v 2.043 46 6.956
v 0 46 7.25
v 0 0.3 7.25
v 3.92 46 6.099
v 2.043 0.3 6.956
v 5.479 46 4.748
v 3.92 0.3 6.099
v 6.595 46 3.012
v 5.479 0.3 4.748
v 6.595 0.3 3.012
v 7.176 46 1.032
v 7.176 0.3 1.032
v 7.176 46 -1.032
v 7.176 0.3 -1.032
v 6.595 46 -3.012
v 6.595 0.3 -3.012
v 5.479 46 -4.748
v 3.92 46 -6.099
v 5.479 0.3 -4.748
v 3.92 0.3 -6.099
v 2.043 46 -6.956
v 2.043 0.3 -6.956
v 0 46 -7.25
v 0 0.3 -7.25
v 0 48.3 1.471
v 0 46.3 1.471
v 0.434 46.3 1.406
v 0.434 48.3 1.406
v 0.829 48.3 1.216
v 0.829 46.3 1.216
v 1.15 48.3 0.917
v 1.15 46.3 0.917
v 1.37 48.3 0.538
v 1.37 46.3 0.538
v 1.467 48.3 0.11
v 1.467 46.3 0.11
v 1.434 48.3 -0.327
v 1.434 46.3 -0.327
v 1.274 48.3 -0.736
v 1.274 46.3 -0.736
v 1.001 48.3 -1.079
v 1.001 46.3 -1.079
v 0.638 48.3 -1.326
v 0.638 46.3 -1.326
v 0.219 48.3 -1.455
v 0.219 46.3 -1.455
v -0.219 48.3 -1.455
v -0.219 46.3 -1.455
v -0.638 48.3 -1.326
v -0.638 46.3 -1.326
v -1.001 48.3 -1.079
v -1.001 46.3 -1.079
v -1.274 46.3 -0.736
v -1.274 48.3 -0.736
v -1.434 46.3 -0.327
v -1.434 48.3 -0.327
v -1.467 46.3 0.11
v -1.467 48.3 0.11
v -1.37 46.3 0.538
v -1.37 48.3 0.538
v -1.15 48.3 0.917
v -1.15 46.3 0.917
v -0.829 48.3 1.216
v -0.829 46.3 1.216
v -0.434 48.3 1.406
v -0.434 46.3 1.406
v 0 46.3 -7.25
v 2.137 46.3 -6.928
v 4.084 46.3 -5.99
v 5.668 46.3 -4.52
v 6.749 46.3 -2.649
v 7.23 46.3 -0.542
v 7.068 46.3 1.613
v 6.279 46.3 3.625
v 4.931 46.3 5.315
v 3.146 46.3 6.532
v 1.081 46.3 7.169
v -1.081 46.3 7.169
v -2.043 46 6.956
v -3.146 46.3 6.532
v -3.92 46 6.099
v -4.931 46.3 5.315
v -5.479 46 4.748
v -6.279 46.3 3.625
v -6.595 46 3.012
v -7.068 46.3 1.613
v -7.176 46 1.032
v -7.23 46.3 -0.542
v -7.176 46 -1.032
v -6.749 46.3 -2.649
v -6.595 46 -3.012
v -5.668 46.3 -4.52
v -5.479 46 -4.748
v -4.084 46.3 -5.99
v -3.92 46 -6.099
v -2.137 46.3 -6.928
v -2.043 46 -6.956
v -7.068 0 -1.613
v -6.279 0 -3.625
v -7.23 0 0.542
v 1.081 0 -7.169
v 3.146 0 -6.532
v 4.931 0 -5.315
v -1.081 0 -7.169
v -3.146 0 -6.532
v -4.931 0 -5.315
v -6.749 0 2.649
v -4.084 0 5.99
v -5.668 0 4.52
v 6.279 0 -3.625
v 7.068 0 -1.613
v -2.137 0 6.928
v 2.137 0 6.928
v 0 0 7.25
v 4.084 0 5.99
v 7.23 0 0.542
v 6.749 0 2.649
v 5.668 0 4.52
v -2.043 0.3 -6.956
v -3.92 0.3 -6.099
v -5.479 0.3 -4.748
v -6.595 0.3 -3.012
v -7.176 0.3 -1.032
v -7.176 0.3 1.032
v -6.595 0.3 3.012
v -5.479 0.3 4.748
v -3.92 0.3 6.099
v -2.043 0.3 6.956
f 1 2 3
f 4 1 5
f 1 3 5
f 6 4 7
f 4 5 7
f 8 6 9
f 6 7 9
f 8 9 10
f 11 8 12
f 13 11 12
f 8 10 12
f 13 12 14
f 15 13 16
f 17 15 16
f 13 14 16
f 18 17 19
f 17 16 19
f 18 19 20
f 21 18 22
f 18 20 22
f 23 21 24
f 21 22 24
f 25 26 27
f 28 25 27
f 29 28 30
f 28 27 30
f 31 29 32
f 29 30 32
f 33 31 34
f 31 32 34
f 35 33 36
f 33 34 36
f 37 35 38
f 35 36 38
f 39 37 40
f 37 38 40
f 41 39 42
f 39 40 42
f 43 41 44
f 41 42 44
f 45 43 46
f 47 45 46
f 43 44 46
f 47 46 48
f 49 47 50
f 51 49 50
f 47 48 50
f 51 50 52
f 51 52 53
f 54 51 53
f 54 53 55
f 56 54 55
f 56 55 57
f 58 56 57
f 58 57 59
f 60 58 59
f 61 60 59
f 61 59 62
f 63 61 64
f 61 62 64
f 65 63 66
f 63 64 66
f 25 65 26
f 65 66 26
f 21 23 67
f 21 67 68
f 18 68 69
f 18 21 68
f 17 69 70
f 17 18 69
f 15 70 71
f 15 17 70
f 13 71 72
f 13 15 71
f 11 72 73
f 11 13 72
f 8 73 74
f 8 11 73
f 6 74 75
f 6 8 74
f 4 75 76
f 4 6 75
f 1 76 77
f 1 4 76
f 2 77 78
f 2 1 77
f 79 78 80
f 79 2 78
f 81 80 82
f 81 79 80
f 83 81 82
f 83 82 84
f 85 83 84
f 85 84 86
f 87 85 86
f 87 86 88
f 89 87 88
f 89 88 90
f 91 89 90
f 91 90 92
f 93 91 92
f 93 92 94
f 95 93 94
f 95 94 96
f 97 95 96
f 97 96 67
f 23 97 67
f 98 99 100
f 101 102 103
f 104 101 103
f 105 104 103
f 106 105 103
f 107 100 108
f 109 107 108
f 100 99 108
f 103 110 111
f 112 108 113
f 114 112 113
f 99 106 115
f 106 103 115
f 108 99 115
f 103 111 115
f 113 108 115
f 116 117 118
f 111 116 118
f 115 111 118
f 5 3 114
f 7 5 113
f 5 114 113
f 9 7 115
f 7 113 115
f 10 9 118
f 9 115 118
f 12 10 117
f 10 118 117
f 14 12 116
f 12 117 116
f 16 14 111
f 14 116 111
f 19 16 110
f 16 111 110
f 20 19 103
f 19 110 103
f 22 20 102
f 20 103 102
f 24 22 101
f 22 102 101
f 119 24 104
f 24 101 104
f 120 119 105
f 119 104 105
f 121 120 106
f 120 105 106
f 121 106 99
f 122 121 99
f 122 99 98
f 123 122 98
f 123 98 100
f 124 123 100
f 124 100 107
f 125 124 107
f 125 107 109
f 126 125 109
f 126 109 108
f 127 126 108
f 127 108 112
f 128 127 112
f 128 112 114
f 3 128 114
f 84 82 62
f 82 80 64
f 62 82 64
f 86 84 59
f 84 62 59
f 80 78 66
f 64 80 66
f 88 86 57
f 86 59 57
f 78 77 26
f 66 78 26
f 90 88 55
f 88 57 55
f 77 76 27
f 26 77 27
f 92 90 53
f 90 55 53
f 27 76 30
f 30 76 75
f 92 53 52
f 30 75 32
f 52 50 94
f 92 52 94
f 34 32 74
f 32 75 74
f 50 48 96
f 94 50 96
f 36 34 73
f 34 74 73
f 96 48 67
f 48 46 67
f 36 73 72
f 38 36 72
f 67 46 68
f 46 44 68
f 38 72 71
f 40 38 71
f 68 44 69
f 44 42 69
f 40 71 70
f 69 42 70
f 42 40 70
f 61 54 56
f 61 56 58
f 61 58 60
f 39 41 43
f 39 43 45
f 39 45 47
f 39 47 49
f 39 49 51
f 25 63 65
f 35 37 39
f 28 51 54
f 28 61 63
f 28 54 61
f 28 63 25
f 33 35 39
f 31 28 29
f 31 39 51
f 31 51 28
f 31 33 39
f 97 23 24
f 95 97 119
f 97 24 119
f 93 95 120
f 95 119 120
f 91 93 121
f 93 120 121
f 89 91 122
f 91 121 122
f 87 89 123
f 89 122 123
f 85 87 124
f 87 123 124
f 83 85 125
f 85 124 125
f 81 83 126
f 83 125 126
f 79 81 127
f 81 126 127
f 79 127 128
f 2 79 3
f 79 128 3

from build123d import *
from build123d.topology import SkipClean

# Parameters (mm, degrees)
SKETCH1_R           = 7.25
BOSS_EXTRUDE1_DEPTH = 46
SKETCH2_R           = 7
CUT_EXTRUDE1_DEPTH  = 64.5
SKETCH4_R           = 7.25
BOSS_EXTRUDE2_DEPTH = 46
SKETCH6_R           = 1.471316345
BOSS_EXTRUDE3_DEPTH = 2


with BuildPart() as part:
    # Sketch1 → Boss-Extrude1 (new body)
    with BuildSketch(Plane(origin=(0, 0, 0), x_dir=(1, 0, 0), z_dir=(0, 1, 0))):
        Circle(SKETCH1_R)
    extrude(amount=BOSS_EXTRUDE1_DEPTH)

    # Sketch2 → Cut-Extrude1 (cut)
    with BuildSketch(Plane(origin=(0, 0.3, 0), x_dir=(-1, 0, 0), z_dir=(0, -1, 0))):
        Circle(SKETCH2_R)
    extrude(amount=-CUT_EXTRUDE1_DEPTH, mode=Mode.SUBTRACT)

    # Sketch4 → Boss-Extrude2 (add)
    with SkipClean():  # the faces are left unmerged after this step: merging them gives an invalid solid
        with BuildSketch(Plane(origin=(0, 0.3, 0), x_dir=(-1, 0, 0), z_dir=(0, -1, 0))):
            Circle(SKETCH4_R)
        extrude(amount=-BOSS_EXTRUDE2_DEPTH)
    add(part.part.scale(1), mode=Mode.REPLACE)  # the faces are merged on a copy

    # Sketch6 → Boss-Extrude3 (add)
    with BuildSketch(Plane(origin=(0, 46.3, 0), x_dir=(1, 0, 0), z_dir=(0, 1, 0))):
        Circle(SKETCH6_R)
    extrude(amount=BOSS_EXTRUDE3_DEPTH)


solid = part.part
